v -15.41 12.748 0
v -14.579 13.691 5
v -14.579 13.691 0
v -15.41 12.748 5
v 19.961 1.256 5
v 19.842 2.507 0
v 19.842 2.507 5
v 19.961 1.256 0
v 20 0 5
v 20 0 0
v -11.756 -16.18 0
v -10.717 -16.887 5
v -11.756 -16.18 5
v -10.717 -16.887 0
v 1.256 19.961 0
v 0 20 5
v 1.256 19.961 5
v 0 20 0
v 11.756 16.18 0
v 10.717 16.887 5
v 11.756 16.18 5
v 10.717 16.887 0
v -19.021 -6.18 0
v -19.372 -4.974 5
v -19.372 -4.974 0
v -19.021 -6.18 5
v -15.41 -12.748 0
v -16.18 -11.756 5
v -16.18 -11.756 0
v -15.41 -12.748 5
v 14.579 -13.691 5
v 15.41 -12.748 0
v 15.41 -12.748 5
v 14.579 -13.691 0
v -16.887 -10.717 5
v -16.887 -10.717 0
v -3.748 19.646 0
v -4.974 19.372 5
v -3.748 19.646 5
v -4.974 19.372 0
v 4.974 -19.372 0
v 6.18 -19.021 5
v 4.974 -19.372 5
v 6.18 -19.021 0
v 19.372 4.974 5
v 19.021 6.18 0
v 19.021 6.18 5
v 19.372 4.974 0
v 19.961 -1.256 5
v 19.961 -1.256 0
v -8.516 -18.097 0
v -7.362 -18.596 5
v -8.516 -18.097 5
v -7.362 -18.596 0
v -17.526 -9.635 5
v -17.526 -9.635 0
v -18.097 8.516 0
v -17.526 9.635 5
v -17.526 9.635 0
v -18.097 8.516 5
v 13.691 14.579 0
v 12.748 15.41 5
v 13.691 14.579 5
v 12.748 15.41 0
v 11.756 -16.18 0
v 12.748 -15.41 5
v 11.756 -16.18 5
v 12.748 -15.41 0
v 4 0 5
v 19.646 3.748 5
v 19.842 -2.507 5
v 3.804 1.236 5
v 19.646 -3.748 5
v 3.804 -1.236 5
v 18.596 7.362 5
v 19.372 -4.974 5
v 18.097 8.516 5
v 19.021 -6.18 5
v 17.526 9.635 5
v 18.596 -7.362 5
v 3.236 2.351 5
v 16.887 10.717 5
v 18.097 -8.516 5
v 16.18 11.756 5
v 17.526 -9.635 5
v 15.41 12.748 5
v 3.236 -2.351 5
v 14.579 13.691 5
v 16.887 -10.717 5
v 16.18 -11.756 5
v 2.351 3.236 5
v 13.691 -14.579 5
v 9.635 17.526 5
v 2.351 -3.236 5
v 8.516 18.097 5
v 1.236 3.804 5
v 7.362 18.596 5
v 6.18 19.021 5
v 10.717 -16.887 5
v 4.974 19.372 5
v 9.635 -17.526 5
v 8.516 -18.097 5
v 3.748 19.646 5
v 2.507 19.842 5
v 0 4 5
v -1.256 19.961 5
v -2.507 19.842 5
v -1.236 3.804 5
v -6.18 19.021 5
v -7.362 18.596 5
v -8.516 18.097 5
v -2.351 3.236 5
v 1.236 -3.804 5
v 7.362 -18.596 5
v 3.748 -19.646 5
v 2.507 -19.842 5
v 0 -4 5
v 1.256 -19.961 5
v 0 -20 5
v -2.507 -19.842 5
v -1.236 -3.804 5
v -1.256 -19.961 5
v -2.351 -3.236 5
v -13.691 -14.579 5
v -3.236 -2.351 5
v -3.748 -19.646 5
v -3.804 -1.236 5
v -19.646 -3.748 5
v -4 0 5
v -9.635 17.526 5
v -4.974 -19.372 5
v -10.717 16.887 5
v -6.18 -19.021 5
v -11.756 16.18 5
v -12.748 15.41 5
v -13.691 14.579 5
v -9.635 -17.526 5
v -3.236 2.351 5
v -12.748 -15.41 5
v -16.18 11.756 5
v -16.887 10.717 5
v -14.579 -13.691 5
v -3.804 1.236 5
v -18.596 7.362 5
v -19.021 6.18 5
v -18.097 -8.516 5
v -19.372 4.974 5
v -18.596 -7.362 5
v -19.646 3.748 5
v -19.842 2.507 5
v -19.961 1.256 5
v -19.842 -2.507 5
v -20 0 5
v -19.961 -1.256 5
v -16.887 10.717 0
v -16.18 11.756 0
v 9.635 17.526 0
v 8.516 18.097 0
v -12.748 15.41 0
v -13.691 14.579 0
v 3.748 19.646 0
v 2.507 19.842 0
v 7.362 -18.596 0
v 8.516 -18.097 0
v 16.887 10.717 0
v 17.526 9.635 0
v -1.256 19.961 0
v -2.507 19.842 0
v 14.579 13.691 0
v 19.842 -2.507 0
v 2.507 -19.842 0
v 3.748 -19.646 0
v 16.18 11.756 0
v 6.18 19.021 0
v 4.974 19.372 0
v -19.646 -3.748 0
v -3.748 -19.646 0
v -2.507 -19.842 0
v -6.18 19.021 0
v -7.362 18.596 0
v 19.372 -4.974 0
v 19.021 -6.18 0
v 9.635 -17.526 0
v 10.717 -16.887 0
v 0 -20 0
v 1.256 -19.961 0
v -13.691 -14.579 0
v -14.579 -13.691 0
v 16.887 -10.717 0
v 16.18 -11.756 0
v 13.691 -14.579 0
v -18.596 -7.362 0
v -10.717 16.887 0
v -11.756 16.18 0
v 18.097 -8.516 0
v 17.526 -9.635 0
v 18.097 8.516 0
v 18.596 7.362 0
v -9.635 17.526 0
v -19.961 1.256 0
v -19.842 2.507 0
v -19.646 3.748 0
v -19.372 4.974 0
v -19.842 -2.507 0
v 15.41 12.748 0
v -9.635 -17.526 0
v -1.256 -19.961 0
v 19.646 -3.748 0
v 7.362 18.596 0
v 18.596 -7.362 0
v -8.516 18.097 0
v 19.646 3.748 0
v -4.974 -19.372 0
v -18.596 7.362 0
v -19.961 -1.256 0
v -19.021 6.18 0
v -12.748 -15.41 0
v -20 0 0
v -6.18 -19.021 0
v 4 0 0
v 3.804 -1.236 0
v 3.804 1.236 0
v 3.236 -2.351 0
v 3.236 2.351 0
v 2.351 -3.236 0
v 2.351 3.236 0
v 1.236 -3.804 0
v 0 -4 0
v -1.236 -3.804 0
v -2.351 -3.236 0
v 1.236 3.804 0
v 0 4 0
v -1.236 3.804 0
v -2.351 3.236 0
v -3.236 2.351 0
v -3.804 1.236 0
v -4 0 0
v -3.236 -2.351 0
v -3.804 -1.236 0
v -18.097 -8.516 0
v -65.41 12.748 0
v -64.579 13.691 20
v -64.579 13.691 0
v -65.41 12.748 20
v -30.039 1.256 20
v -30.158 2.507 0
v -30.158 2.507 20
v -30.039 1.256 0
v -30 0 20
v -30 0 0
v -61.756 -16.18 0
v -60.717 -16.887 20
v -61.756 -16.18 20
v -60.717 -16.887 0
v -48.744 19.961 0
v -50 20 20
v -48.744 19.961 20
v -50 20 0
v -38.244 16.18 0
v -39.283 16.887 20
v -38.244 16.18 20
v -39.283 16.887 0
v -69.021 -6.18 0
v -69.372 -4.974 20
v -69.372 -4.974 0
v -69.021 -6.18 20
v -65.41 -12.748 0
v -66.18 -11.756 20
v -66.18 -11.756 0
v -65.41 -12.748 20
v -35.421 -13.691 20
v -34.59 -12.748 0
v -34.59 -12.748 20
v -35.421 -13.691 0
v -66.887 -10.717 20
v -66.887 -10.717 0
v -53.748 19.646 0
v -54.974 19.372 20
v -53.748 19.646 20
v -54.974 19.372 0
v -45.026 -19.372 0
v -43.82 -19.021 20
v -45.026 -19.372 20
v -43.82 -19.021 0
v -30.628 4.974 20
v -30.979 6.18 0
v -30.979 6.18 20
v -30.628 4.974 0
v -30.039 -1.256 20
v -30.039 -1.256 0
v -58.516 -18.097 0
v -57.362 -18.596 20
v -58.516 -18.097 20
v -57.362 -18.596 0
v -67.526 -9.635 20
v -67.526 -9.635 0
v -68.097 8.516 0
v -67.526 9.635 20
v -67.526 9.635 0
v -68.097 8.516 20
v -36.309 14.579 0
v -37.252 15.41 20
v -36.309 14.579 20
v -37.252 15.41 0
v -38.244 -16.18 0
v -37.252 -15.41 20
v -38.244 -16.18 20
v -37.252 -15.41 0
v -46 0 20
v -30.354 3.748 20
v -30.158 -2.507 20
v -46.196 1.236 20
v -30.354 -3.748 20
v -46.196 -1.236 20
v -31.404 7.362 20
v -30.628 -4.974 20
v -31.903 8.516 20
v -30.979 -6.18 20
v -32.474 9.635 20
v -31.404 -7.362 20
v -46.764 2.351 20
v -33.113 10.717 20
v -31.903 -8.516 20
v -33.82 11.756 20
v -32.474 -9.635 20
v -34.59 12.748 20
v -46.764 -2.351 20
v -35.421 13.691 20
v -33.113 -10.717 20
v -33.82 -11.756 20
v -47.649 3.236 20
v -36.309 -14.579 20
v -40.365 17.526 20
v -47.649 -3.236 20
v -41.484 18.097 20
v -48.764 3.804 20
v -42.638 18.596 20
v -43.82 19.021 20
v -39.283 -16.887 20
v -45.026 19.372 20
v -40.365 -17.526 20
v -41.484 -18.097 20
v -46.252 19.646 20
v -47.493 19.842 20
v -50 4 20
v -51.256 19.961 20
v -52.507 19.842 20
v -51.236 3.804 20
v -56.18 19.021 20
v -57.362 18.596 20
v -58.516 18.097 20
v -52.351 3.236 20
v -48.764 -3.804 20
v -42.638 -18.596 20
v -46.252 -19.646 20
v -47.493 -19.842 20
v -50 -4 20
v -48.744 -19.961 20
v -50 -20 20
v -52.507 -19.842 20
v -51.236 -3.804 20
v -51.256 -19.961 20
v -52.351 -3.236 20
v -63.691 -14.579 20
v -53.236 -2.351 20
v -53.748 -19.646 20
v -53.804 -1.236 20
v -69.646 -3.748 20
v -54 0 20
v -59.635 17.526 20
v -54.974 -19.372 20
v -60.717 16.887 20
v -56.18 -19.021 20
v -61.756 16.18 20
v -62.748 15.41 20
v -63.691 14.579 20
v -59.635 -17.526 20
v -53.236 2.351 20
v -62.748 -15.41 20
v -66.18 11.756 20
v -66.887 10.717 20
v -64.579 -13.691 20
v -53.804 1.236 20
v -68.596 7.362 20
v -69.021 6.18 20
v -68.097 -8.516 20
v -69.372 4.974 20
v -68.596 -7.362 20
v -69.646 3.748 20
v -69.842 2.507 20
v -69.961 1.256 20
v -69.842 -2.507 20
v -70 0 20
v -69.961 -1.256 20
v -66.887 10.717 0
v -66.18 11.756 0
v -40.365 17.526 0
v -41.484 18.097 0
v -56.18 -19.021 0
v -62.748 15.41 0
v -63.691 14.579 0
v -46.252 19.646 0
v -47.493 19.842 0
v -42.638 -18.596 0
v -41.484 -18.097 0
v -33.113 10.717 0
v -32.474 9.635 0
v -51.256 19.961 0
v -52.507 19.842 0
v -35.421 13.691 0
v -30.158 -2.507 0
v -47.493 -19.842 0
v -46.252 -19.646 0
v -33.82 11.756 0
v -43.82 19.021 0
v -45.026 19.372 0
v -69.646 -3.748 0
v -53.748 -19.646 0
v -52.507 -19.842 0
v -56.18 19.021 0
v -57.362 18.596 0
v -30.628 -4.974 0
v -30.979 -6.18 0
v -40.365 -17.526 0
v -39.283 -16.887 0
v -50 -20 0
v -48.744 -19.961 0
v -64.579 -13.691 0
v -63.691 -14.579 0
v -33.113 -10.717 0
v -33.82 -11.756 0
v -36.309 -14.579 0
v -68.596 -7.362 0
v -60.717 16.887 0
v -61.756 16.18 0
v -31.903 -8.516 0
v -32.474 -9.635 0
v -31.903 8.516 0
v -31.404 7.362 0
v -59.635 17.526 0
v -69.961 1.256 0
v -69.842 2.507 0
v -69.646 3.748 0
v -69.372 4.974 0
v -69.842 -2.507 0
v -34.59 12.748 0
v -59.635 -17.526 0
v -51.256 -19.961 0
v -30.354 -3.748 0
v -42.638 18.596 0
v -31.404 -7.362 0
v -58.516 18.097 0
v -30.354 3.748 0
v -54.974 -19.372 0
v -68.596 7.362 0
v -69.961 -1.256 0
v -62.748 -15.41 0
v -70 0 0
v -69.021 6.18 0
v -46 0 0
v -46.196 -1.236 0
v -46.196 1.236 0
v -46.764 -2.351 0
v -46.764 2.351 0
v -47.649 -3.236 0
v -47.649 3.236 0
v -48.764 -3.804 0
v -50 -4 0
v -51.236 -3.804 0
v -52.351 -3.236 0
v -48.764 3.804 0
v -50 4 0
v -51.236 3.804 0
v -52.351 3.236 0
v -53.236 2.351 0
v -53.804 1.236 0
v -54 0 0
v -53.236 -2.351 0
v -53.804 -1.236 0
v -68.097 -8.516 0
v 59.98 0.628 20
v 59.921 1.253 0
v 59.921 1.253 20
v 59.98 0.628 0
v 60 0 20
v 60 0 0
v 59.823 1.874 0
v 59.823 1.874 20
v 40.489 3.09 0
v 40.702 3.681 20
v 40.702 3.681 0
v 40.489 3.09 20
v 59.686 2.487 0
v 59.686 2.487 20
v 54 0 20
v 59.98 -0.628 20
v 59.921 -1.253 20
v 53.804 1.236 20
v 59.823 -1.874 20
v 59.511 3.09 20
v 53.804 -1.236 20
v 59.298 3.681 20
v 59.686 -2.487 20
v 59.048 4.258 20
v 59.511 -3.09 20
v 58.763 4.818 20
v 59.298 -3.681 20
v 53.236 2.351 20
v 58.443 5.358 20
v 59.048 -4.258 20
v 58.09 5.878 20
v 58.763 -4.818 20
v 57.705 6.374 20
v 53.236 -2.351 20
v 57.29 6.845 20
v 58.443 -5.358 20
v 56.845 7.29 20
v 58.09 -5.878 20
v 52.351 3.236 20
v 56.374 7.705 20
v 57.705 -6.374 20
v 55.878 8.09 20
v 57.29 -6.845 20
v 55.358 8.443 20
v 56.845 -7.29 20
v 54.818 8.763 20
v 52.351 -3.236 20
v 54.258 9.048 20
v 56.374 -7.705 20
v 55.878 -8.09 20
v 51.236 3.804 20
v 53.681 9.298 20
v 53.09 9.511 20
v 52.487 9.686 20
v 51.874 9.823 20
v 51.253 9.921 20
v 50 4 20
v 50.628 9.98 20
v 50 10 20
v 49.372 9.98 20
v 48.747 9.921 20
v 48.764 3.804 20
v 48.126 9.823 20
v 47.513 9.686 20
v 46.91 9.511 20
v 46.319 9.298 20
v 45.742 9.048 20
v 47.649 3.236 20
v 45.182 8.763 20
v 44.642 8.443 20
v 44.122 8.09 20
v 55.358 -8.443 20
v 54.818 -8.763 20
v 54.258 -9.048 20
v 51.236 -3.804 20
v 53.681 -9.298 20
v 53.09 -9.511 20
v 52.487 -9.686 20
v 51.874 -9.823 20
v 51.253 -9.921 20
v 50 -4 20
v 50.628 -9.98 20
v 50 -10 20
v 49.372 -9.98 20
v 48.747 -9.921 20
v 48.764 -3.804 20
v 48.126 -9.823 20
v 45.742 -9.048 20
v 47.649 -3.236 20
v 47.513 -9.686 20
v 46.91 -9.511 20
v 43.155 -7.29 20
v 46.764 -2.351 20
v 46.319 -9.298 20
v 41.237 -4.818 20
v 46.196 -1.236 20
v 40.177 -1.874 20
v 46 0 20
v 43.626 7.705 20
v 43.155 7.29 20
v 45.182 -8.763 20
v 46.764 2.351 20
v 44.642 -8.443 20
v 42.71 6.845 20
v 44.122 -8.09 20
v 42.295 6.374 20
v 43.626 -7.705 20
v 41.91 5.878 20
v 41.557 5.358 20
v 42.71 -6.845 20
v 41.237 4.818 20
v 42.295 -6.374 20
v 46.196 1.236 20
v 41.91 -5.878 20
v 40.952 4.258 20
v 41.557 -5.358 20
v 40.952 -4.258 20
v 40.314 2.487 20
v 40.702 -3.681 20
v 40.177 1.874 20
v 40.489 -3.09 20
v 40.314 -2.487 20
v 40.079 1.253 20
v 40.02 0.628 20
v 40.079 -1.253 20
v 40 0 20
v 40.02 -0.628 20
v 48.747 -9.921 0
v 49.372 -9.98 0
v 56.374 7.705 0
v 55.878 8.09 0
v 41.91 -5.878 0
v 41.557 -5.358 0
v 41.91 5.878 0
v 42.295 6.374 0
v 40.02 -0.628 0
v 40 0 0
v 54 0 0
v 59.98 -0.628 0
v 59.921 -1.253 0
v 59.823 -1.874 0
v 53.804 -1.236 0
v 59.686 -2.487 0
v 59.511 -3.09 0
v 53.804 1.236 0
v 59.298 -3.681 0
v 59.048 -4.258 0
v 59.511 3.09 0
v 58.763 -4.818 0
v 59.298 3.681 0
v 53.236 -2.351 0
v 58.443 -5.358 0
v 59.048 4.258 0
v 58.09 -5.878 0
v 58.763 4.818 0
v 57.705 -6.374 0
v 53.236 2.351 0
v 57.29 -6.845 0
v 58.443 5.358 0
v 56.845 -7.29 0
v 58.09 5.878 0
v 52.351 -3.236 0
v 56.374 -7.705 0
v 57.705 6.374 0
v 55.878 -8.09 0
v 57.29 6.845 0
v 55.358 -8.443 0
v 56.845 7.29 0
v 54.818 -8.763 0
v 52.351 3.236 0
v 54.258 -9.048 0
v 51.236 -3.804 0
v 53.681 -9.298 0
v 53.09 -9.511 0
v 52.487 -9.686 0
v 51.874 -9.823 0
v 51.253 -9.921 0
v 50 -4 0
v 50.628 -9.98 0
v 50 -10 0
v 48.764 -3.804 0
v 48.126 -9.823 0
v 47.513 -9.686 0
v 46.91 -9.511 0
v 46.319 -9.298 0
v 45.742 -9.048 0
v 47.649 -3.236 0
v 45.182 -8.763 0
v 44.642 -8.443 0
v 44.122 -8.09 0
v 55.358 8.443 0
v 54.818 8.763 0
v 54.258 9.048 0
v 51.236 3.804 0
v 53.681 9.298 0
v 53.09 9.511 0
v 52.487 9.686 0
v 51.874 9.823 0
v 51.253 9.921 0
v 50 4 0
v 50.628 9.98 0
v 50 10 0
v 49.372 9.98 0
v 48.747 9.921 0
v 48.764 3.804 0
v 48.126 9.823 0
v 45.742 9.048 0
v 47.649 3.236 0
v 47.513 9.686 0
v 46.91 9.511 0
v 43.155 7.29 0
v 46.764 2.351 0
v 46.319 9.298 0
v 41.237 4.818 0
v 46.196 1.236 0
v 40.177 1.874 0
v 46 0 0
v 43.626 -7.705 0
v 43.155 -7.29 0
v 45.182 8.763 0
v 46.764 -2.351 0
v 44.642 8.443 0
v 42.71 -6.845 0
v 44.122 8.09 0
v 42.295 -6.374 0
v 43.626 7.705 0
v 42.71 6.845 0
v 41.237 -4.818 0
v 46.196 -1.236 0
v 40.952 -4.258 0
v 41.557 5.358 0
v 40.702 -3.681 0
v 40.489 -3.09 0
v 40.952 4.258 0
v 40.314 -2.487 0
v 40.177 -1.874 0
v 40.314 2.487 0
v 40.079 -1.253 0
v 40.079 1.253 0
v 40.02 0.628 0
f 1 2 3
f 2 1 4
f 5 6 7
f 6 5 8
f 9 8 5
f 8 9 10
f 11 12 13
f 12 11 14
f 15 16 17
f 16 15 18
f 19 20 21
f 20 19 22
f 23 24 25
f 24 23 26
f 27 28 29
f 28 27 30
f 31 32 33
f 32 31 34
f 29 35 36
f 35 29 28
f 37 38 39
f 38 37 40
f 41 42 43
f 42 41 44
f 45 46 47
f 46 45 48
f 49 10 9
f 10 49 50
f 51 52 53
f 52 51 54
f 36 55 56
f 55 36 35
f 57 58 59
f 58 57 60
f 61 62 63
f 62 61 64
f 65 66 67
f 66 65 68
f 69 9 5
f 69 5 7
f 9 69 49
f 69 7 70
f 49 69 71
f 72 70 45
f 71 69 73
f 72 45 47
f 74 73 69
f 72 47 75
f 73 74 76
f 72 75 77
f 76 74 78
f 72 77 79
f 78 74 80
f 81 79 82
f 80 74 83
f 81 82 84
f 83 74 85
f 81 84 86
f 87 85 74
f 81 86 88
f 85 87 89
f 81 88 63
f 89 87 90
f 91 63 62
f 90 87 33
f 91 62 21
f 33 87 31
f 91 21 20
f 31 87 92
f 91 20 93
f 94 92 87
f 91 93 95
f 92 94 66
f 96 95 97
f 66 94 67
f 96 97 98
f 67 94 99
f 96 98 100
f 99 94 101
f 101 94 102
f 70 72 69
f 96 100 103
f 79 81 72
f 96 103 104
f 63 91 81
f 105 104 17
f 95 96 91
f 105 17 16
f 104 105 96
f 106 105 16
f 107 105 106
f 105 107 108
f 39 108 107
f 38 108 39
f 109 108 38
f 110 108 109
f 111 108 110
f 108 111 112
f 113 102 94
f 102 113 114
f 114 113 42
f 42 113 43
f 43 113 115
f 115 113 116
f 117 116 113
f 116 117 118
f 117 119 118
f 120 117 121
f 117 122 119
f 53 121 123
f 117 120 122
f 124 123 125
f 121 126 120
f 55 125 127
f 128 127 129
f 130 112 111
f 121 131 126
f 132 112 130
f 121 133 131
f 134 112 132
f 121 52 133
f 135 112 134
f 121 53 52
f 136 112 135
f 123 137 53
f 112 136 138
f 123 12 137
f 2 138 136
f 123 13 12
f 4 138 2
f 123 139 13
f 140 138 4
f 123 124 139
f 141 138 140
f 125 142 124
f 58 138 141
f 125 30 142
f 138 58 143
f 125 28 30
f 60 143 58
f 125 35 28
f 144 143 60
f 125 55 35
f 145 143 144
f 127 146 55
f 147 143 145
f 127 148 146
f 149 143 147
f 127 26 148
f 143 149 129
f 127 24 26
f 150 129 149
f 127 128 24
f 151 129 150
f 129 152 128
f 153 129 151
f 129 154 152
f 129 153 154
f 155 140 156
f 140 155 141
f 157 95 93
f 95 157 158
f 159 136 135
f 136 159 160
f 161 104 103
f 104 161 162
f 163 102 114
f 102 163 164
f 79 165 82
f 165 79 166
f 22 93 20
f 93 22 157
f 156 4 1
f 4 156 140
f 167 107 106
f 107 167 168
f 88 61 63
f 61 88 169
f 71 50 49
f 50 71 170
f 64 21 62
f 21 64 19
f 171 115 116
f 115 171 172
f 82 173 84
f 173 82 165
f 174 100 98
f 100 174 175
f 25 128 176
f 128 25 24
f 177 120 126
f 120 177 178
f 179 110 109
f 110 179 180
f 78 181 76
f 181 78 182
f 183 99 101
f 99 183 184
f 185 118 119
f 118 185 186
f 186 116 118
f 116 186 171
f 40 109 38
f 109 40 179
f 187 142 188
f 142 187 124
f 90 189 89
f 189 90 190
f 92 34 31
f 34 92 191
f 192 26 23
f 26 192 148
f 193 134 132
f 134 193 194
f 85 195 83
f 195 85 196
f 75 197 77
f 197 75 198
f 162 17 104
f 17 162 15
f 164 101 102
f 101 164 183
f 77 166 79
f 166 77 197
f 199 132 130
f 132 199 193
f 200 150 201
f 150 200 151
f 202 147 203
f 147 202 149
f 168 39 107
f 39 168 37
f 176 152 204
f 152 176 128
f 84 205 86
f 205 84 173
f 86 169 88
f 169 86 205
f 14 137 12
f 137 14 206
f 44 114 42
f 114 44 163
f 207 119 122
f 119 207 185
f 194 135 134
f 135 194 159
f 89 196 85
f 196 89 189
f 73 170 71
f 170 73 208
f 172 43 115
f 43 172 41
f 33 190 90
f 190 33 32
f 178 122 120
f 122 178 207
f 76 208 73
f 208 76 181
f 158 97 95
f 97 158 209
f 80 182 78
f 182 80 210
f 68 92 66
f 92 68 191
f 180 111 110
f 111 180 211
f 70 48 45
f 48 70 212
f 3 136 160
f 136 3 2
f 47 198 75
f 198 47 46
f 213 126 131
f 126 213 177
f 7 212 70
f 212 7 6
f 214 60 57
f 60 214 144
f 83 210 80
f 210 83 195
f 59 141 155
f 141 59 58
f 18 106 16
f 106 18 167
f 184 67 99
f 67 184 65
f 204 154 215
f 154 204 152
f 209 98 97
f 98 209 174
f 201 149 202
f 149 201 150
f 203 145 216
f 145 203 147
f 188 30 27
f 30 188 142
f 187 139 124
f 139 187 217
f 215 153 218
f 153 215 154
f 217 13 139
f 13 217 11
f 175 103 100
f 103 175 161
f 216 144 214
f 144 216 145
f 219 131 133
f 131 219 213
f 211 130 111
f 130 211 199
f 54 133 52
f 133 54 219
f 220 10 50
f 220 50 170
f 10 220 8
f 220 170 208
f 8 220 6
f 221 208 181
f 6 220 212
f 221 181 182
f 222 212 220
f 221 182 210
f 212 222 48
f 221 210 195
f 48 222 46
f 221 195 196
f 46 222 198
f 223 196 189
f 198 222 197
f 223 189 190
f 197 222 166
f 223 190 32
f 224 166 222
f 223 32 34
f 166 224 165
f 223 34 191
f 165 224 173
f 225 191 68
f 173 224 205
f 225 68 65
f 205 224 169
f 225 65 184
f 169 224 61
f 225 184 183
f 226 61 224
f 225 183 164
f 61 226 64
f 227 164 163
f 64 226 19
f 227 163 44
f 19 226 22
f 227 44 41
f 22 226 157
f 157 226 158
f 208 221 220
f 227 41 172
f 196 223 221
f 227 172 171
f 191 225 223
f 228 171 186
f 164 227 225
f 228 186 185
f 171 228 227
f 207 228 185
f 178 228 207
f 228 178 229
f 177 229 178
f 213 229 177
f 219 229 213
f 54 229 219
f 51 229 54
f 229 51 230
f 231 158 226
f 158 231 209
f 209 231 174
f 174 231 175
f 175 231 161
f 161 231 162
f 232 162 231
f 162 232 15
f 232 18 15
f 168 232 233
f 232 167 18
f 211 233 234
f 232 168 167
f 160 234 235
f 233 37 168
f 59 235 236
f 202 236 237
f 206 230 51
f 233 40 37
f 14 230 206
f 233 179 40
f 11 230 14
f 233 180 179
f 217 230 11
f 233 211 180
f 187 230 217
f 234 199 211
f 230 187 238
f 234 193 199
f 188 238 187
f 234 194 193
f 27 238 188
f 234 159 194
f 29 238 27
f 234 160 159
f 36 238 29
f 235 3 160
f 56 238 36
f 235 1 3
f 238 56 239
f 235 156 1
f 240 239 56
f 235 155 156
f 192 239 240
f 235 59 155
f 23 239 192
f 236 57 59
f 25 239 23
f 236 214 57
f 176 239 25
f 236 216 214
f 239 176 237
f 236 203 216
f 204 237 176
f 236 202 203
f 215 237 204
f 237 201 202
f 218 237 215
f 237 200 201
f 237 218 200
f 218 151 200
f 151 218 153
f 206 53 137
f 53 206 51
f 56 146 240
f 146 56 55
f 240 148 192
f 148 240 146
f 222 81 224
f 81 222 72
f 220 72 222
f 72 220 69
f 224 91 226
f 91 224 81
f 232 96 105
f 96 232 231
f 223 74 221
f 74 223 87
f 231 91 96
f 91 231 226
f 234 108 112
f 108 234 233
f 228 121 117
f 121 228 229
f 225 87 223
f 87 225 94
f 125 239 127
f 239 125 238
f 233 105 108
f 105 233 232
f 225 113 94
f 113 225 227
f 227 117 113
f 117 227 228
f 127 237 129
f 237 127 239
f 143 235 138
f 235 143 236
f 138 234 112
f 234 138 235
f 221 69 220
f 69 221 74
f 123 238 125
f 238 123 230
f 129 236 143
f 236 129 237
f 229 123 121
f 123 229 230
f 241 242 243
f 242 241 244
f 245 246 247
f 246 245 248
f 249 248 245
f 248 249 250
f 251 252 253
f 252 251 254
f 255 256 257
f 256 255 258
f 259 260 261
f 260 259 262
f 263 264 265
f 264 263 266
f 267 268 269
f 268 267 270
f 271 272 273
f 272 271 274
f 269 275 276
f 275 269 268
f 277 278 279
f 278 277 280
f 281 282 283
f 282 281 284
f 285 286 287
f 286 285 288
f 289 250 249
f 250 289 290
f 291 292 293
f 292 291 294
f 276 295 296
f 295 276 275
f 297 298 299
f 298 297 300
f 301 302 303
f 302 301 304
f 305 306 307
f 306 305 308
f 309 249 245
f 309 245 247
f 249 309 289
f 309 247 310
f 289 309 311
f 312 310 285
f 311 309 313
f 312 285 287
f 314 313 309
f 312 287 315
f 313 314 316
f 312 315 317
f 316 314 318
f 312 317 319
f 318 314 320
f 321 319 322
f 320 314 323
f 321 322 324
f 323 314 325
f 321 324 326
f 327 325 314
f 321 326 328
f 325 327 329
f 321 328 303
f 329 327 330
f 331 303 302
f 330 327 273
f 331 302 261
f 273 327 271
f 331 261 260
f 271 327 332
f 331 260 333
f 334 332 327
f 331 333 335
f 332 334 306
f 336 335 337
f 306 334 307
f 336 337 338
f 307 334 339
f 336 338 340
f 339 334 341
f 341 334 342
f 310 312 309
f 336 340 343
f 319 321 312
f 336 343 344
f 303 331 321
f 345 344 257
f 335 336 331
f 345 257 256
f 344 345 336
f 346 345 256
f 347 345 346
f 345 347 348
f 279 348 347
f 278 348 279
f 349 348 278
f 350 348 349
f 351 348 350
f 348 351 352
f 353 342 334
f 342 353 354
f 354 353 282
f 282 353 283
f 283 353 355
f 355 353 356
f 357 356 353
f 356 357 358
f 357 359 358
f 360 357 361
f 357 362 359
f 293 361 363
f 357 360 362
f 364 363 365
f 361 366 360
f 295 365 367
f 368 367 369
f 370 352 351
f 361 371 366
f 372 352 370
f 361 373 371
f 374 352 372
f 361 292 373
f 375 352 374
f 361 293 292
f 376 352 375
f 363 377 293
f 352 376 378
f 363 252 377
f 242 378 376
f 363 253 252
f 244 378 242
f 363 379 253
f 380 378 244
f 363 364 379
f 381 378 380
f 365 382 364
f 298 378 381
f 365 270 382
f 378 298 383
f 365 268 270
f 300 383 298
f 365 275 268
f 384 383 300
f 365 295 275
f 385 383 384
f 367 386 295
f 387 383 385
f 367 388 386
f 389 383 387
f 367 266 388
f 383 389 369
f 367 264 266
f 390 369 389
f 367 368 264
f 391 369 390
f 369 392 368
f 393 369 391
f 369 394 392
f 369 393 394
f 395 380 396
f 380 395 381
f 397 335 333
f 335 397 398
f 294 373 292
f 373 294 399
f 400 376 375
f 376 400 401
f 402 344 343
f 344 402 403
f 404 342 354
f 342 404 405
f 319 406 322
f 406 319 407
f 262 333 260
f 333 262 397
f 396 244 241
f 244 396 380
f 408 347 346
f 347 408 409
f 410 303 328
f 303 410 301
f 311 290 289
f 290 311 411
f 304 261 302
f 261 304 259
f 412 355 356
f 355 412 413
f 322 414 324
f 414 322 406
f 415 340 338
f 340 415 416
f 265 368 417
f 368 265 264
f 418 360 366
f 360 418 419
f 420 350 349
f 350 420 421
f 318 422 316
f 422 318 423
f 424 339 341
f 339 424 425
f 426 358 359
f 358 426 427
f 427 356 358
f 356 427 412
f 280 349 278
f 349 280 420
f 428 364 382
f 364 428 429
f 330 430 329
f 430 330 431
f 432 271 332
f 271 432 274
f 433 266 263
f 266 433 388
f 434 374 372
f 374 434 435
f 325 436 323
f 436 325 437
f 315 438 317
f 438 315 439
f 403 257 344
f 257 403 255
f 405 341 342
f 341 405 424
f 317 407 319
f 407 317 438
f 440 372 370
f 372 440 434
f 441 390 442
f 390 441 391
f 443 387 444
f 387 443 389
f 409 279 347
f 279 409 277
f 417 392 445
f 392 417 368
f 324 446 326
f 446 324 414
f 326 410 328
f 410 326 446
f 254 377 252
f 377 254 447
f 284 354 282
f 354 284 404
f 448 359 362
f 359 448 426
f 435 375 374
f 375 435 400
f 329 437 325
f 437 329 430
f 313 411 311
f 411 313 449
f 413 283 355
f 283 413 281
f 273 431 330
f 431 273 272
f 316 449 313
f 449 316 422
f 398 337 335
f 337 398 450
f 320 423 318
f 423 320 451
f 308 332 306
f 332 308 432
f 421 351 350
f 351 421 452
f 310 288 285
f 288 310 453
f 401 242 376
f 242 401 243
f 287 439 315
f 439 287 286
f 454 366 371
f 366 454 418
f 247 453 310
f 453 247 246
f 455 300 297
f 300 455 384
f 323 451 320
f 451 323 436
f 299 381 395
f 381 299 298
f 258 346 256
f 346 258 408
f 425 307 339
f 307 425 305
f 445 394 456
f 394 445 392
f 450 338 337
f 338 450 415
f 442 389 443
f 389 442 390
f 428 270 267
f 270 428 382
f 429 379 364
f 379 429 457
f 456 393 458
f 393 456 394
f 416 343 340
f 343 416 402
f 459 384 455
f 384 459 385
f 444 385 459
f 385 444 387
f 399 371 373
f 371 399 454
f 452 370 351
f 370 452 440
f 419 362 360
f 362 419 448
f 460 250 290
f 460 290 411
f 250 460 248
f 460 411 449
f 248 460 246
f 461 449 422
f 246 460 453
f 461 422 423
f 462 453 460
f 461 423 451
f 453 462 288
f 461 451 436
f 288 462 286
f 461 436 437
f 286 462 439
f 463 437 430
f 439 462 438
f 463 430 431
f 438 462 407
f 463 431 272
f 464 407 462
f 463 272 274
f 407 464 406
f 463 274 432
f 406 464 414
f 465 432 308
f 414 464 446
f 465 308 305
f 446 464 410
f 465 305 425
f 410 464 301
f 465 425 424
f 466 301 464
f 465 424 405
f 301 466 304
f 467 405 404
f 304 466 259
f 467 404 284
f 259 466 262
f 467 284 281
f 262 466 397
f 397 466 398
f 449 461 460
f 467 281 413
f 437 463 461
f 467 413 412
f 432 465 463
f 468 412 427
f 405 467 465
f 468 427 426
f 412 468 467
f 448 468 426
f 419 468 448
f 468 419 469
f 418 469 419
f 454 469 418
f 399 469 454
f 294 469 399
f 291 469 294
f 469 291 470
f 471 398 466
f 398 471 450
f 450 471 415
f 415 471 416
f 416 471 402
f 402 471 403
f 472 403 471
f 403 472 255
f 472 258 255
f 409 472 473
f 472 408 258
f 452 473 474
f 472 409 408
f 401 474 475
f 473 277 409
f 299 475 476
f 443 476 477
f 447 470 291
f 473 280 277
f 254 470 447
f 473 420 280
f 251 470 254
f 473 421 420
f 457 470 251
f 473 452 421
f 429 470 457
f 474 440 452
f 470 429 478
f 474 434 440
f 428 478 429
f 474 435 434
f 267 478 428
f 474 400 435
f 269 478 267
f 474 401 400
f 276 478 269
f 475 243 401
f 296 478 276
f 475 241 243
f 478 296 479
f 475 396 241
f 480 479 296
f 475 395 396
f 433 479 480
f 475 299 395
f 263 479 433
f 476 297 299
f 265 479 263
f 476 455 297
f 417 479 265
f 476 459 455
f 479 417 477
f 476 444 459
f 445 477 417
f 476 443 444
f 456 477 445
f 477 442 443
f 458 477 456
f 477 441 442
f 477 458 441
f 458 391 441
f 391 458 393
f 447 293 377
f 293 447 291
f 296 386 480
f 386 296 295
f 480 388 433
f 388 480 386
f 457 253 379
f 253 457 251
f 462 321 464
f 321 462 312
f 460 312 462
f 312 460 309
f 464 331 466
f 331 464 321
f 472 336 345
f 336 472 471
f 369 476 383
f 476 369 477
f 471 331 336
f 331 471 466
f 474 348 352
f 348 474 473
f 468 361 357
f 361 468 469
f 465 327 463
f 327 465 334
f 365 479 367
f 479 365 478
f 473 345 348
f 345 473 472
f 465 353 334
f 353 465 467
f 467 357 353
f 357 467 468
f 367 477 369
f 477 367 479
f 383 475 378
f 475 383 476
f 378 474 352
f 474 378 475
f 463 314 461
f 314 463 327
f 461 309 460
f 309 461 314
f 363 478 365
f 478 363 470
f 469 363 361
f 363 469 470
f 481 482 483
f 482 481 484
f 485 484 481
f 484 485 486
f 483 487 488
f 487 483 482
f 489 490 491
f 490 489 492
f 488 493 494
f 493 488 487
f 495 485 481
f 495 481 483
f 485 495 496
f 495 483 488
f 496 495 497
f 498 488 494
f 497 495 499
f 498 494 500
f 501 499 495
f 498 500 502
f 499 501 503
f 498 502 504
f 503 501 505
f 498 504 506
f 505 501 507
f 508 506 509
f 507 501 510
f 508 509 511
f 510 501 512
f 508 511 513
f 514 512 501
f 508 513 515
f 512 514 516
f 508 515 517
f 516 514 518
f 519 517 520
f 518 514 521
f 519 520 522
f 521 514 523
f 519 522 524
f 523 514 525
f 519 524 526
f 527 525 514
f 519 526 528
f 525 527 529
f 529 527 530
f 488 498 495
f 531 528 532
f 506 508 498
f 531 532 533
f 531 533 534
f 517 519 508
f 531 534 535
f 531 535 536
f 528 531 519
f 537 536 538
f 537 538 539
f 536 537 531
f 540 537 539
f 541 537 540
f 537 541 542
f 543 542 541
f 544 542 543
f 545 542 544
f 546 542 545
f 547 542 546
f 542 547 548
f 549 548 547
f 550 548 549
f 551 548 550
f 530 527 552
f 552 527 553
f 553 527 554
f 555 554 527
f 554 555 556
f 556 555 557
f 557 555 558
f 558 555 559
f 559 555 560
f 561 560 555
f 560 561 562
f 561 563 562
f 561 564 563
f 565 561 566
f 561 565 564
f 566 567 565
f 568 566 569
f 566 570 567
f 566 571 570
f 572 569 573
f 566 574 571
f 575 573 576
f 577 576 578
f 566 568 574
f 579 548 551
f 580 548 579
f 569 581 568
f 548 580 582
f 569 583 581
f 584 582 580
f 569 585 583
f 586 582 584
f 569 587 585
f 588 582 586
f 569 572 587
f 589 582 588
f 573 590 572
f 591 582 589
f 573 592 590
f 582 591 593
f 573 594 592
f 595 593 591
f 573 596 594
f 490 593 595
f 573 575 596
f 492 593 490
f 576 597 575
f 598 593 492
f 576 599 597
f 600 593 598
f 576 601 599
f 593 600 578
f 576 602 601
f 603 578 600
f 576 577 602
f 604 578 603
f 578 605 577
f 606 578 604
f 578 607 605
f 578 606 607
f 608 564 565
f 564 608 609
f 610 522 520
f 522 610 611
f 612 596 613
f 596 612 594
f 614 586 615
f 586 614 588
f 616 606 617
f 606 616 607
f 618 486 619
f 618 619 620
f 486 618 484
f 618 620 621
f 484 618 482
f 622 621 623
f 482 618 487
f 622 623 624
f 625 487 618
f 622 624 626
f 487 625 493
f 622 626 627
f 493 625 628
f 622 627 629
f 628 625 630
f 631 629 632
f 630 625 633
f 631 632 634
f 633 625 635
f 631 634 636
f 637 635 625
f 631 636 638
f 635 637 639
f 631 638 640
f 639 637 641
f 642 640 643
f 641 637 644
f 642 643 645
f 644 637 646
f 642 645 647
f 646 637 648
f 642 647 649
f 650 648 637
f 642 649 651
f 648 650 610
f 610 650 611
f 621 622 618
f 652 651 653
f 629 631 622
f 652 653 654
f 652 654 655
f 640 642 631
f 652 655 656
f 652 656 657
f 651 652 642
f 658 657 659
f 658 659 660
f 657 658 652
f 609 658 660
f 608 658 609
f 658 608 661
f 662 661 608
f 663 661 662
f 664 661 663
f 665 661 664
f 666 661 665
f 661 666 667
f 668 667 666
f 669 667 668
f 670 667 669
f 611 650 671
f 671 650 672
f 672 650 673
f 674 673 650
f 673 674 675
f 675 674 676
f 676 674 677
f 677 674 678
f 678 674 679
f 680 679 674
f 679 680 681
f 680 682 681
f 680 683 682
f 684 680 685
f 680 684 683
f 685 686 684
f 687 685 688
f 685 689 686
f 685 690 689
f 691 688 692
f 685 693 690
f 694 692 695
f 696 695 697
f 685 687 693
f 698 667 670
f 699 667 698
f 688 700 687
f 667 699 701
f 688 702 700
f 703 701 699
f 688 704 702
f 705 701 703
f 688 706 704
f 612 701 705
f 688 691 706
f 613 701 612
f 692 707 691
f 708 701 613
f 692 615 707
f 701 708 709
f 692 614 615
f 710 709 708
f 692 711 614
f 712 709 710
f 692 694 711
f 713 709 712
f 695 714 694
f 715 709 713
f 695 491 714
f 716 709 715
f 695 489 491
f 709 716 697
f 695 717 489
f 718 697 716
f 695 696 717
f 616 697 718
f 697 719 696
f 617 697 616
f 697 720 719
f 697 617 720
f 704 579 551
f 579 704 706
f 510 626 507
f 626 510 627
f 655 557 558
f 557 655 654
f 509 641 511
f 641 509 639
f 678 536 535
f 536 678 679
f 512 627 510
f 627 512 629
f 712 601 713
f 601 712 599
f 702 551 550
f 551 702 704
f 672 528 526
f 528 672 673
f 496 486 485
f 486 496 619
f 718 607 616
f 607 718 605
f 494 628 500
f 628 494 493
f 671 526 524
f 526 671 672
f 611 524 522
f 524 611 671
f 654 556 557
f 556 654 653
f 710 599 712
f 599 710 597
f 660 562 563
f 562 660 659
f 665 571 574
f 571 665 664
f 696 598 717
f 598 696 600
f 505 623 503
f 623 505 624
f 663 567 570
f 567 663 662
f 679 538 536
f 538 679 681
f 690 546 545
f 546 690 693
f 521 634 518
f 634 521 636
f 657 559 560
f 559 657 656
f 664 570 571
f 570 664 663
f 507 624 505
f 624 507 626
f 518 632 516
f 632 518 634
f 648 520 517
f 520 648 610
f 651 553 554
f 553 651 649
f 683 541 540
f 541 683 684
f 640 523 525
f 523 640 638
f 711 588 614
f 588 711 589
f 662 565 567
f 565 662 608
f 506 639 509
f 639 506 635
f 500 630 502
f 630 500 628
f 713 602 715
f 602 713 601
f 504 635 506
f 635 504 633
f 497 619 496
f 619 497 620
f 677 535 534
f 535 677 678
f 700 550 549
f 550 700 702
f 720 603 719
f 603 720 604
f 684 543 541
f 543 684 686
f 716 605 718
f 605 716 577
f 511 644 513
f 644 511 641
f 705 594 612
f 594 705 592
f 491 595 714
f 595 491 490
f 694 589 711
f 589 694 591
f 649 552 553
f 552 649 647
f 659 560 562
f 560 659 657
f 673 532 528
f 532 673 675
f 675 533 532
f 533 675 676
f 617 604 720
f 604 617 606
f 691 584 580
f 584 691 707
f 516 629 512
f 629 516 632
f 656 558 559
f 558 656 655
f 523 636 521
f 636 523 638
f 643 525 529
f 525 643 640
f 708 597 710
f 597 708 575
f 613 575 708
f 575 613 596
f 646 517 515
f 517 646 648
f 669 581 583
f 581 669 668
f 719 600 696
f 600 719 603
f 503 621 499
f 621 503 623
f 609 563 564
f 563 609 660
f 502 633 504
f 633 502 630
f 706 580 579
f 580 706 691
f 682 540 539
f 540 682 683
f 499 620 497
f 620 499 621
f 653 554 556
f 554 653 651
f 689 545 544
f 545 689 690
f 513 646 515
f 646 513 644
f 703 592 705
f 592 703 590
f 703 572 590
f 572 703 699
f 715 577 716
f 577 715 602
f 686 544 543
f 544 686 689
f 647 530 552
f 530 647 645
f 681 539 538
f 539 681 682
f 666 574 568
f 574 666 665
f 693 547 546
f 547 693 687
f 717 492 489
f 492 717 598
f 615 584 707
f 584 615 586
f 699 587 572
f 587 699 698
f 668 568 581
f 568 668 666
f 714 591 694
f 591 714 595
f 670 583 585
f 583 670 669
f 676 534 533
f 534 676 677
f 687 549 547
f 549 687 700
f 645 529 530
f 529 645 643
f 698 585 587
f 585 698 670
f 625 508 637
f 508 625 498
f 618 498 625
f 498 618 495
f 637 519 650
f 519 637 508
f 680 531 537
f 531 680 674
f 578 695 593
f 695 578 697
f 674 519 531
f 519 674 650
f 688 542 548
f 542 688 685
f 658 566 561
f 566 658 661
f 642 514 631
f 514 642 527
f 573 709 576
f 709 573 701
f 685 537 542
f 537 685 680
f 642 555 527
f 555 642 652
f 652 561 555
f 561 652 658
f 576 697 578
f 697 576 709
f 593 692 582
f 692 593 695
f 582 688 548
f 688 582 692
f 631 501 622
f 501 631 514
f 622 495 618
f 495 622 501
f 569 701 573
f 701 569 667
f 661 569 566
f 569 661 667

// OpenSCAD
module rueda_simple(grosor=5, diametro=40, diam_eje=8){

    //-- Construcción rueda simple a partir de parametros
    difference(){
        //-- Base de la rueda
        cylinder(r=diametro/2, h=grosor, $fn=100);
    
        //--Taladro de 8mm
        cylinder(r=diam_eje/2, h=3*grosor, $fn=20, center=true);
    }
}

//-- Ejemplos de uso del modulo
//-- Rueda por defecto
rueda_simple();

translate([-50,0,0])
    rueda_simple(grosor=20);

translate([50,0,0])
    rueda_simple(grosor=20, diametro=20);
